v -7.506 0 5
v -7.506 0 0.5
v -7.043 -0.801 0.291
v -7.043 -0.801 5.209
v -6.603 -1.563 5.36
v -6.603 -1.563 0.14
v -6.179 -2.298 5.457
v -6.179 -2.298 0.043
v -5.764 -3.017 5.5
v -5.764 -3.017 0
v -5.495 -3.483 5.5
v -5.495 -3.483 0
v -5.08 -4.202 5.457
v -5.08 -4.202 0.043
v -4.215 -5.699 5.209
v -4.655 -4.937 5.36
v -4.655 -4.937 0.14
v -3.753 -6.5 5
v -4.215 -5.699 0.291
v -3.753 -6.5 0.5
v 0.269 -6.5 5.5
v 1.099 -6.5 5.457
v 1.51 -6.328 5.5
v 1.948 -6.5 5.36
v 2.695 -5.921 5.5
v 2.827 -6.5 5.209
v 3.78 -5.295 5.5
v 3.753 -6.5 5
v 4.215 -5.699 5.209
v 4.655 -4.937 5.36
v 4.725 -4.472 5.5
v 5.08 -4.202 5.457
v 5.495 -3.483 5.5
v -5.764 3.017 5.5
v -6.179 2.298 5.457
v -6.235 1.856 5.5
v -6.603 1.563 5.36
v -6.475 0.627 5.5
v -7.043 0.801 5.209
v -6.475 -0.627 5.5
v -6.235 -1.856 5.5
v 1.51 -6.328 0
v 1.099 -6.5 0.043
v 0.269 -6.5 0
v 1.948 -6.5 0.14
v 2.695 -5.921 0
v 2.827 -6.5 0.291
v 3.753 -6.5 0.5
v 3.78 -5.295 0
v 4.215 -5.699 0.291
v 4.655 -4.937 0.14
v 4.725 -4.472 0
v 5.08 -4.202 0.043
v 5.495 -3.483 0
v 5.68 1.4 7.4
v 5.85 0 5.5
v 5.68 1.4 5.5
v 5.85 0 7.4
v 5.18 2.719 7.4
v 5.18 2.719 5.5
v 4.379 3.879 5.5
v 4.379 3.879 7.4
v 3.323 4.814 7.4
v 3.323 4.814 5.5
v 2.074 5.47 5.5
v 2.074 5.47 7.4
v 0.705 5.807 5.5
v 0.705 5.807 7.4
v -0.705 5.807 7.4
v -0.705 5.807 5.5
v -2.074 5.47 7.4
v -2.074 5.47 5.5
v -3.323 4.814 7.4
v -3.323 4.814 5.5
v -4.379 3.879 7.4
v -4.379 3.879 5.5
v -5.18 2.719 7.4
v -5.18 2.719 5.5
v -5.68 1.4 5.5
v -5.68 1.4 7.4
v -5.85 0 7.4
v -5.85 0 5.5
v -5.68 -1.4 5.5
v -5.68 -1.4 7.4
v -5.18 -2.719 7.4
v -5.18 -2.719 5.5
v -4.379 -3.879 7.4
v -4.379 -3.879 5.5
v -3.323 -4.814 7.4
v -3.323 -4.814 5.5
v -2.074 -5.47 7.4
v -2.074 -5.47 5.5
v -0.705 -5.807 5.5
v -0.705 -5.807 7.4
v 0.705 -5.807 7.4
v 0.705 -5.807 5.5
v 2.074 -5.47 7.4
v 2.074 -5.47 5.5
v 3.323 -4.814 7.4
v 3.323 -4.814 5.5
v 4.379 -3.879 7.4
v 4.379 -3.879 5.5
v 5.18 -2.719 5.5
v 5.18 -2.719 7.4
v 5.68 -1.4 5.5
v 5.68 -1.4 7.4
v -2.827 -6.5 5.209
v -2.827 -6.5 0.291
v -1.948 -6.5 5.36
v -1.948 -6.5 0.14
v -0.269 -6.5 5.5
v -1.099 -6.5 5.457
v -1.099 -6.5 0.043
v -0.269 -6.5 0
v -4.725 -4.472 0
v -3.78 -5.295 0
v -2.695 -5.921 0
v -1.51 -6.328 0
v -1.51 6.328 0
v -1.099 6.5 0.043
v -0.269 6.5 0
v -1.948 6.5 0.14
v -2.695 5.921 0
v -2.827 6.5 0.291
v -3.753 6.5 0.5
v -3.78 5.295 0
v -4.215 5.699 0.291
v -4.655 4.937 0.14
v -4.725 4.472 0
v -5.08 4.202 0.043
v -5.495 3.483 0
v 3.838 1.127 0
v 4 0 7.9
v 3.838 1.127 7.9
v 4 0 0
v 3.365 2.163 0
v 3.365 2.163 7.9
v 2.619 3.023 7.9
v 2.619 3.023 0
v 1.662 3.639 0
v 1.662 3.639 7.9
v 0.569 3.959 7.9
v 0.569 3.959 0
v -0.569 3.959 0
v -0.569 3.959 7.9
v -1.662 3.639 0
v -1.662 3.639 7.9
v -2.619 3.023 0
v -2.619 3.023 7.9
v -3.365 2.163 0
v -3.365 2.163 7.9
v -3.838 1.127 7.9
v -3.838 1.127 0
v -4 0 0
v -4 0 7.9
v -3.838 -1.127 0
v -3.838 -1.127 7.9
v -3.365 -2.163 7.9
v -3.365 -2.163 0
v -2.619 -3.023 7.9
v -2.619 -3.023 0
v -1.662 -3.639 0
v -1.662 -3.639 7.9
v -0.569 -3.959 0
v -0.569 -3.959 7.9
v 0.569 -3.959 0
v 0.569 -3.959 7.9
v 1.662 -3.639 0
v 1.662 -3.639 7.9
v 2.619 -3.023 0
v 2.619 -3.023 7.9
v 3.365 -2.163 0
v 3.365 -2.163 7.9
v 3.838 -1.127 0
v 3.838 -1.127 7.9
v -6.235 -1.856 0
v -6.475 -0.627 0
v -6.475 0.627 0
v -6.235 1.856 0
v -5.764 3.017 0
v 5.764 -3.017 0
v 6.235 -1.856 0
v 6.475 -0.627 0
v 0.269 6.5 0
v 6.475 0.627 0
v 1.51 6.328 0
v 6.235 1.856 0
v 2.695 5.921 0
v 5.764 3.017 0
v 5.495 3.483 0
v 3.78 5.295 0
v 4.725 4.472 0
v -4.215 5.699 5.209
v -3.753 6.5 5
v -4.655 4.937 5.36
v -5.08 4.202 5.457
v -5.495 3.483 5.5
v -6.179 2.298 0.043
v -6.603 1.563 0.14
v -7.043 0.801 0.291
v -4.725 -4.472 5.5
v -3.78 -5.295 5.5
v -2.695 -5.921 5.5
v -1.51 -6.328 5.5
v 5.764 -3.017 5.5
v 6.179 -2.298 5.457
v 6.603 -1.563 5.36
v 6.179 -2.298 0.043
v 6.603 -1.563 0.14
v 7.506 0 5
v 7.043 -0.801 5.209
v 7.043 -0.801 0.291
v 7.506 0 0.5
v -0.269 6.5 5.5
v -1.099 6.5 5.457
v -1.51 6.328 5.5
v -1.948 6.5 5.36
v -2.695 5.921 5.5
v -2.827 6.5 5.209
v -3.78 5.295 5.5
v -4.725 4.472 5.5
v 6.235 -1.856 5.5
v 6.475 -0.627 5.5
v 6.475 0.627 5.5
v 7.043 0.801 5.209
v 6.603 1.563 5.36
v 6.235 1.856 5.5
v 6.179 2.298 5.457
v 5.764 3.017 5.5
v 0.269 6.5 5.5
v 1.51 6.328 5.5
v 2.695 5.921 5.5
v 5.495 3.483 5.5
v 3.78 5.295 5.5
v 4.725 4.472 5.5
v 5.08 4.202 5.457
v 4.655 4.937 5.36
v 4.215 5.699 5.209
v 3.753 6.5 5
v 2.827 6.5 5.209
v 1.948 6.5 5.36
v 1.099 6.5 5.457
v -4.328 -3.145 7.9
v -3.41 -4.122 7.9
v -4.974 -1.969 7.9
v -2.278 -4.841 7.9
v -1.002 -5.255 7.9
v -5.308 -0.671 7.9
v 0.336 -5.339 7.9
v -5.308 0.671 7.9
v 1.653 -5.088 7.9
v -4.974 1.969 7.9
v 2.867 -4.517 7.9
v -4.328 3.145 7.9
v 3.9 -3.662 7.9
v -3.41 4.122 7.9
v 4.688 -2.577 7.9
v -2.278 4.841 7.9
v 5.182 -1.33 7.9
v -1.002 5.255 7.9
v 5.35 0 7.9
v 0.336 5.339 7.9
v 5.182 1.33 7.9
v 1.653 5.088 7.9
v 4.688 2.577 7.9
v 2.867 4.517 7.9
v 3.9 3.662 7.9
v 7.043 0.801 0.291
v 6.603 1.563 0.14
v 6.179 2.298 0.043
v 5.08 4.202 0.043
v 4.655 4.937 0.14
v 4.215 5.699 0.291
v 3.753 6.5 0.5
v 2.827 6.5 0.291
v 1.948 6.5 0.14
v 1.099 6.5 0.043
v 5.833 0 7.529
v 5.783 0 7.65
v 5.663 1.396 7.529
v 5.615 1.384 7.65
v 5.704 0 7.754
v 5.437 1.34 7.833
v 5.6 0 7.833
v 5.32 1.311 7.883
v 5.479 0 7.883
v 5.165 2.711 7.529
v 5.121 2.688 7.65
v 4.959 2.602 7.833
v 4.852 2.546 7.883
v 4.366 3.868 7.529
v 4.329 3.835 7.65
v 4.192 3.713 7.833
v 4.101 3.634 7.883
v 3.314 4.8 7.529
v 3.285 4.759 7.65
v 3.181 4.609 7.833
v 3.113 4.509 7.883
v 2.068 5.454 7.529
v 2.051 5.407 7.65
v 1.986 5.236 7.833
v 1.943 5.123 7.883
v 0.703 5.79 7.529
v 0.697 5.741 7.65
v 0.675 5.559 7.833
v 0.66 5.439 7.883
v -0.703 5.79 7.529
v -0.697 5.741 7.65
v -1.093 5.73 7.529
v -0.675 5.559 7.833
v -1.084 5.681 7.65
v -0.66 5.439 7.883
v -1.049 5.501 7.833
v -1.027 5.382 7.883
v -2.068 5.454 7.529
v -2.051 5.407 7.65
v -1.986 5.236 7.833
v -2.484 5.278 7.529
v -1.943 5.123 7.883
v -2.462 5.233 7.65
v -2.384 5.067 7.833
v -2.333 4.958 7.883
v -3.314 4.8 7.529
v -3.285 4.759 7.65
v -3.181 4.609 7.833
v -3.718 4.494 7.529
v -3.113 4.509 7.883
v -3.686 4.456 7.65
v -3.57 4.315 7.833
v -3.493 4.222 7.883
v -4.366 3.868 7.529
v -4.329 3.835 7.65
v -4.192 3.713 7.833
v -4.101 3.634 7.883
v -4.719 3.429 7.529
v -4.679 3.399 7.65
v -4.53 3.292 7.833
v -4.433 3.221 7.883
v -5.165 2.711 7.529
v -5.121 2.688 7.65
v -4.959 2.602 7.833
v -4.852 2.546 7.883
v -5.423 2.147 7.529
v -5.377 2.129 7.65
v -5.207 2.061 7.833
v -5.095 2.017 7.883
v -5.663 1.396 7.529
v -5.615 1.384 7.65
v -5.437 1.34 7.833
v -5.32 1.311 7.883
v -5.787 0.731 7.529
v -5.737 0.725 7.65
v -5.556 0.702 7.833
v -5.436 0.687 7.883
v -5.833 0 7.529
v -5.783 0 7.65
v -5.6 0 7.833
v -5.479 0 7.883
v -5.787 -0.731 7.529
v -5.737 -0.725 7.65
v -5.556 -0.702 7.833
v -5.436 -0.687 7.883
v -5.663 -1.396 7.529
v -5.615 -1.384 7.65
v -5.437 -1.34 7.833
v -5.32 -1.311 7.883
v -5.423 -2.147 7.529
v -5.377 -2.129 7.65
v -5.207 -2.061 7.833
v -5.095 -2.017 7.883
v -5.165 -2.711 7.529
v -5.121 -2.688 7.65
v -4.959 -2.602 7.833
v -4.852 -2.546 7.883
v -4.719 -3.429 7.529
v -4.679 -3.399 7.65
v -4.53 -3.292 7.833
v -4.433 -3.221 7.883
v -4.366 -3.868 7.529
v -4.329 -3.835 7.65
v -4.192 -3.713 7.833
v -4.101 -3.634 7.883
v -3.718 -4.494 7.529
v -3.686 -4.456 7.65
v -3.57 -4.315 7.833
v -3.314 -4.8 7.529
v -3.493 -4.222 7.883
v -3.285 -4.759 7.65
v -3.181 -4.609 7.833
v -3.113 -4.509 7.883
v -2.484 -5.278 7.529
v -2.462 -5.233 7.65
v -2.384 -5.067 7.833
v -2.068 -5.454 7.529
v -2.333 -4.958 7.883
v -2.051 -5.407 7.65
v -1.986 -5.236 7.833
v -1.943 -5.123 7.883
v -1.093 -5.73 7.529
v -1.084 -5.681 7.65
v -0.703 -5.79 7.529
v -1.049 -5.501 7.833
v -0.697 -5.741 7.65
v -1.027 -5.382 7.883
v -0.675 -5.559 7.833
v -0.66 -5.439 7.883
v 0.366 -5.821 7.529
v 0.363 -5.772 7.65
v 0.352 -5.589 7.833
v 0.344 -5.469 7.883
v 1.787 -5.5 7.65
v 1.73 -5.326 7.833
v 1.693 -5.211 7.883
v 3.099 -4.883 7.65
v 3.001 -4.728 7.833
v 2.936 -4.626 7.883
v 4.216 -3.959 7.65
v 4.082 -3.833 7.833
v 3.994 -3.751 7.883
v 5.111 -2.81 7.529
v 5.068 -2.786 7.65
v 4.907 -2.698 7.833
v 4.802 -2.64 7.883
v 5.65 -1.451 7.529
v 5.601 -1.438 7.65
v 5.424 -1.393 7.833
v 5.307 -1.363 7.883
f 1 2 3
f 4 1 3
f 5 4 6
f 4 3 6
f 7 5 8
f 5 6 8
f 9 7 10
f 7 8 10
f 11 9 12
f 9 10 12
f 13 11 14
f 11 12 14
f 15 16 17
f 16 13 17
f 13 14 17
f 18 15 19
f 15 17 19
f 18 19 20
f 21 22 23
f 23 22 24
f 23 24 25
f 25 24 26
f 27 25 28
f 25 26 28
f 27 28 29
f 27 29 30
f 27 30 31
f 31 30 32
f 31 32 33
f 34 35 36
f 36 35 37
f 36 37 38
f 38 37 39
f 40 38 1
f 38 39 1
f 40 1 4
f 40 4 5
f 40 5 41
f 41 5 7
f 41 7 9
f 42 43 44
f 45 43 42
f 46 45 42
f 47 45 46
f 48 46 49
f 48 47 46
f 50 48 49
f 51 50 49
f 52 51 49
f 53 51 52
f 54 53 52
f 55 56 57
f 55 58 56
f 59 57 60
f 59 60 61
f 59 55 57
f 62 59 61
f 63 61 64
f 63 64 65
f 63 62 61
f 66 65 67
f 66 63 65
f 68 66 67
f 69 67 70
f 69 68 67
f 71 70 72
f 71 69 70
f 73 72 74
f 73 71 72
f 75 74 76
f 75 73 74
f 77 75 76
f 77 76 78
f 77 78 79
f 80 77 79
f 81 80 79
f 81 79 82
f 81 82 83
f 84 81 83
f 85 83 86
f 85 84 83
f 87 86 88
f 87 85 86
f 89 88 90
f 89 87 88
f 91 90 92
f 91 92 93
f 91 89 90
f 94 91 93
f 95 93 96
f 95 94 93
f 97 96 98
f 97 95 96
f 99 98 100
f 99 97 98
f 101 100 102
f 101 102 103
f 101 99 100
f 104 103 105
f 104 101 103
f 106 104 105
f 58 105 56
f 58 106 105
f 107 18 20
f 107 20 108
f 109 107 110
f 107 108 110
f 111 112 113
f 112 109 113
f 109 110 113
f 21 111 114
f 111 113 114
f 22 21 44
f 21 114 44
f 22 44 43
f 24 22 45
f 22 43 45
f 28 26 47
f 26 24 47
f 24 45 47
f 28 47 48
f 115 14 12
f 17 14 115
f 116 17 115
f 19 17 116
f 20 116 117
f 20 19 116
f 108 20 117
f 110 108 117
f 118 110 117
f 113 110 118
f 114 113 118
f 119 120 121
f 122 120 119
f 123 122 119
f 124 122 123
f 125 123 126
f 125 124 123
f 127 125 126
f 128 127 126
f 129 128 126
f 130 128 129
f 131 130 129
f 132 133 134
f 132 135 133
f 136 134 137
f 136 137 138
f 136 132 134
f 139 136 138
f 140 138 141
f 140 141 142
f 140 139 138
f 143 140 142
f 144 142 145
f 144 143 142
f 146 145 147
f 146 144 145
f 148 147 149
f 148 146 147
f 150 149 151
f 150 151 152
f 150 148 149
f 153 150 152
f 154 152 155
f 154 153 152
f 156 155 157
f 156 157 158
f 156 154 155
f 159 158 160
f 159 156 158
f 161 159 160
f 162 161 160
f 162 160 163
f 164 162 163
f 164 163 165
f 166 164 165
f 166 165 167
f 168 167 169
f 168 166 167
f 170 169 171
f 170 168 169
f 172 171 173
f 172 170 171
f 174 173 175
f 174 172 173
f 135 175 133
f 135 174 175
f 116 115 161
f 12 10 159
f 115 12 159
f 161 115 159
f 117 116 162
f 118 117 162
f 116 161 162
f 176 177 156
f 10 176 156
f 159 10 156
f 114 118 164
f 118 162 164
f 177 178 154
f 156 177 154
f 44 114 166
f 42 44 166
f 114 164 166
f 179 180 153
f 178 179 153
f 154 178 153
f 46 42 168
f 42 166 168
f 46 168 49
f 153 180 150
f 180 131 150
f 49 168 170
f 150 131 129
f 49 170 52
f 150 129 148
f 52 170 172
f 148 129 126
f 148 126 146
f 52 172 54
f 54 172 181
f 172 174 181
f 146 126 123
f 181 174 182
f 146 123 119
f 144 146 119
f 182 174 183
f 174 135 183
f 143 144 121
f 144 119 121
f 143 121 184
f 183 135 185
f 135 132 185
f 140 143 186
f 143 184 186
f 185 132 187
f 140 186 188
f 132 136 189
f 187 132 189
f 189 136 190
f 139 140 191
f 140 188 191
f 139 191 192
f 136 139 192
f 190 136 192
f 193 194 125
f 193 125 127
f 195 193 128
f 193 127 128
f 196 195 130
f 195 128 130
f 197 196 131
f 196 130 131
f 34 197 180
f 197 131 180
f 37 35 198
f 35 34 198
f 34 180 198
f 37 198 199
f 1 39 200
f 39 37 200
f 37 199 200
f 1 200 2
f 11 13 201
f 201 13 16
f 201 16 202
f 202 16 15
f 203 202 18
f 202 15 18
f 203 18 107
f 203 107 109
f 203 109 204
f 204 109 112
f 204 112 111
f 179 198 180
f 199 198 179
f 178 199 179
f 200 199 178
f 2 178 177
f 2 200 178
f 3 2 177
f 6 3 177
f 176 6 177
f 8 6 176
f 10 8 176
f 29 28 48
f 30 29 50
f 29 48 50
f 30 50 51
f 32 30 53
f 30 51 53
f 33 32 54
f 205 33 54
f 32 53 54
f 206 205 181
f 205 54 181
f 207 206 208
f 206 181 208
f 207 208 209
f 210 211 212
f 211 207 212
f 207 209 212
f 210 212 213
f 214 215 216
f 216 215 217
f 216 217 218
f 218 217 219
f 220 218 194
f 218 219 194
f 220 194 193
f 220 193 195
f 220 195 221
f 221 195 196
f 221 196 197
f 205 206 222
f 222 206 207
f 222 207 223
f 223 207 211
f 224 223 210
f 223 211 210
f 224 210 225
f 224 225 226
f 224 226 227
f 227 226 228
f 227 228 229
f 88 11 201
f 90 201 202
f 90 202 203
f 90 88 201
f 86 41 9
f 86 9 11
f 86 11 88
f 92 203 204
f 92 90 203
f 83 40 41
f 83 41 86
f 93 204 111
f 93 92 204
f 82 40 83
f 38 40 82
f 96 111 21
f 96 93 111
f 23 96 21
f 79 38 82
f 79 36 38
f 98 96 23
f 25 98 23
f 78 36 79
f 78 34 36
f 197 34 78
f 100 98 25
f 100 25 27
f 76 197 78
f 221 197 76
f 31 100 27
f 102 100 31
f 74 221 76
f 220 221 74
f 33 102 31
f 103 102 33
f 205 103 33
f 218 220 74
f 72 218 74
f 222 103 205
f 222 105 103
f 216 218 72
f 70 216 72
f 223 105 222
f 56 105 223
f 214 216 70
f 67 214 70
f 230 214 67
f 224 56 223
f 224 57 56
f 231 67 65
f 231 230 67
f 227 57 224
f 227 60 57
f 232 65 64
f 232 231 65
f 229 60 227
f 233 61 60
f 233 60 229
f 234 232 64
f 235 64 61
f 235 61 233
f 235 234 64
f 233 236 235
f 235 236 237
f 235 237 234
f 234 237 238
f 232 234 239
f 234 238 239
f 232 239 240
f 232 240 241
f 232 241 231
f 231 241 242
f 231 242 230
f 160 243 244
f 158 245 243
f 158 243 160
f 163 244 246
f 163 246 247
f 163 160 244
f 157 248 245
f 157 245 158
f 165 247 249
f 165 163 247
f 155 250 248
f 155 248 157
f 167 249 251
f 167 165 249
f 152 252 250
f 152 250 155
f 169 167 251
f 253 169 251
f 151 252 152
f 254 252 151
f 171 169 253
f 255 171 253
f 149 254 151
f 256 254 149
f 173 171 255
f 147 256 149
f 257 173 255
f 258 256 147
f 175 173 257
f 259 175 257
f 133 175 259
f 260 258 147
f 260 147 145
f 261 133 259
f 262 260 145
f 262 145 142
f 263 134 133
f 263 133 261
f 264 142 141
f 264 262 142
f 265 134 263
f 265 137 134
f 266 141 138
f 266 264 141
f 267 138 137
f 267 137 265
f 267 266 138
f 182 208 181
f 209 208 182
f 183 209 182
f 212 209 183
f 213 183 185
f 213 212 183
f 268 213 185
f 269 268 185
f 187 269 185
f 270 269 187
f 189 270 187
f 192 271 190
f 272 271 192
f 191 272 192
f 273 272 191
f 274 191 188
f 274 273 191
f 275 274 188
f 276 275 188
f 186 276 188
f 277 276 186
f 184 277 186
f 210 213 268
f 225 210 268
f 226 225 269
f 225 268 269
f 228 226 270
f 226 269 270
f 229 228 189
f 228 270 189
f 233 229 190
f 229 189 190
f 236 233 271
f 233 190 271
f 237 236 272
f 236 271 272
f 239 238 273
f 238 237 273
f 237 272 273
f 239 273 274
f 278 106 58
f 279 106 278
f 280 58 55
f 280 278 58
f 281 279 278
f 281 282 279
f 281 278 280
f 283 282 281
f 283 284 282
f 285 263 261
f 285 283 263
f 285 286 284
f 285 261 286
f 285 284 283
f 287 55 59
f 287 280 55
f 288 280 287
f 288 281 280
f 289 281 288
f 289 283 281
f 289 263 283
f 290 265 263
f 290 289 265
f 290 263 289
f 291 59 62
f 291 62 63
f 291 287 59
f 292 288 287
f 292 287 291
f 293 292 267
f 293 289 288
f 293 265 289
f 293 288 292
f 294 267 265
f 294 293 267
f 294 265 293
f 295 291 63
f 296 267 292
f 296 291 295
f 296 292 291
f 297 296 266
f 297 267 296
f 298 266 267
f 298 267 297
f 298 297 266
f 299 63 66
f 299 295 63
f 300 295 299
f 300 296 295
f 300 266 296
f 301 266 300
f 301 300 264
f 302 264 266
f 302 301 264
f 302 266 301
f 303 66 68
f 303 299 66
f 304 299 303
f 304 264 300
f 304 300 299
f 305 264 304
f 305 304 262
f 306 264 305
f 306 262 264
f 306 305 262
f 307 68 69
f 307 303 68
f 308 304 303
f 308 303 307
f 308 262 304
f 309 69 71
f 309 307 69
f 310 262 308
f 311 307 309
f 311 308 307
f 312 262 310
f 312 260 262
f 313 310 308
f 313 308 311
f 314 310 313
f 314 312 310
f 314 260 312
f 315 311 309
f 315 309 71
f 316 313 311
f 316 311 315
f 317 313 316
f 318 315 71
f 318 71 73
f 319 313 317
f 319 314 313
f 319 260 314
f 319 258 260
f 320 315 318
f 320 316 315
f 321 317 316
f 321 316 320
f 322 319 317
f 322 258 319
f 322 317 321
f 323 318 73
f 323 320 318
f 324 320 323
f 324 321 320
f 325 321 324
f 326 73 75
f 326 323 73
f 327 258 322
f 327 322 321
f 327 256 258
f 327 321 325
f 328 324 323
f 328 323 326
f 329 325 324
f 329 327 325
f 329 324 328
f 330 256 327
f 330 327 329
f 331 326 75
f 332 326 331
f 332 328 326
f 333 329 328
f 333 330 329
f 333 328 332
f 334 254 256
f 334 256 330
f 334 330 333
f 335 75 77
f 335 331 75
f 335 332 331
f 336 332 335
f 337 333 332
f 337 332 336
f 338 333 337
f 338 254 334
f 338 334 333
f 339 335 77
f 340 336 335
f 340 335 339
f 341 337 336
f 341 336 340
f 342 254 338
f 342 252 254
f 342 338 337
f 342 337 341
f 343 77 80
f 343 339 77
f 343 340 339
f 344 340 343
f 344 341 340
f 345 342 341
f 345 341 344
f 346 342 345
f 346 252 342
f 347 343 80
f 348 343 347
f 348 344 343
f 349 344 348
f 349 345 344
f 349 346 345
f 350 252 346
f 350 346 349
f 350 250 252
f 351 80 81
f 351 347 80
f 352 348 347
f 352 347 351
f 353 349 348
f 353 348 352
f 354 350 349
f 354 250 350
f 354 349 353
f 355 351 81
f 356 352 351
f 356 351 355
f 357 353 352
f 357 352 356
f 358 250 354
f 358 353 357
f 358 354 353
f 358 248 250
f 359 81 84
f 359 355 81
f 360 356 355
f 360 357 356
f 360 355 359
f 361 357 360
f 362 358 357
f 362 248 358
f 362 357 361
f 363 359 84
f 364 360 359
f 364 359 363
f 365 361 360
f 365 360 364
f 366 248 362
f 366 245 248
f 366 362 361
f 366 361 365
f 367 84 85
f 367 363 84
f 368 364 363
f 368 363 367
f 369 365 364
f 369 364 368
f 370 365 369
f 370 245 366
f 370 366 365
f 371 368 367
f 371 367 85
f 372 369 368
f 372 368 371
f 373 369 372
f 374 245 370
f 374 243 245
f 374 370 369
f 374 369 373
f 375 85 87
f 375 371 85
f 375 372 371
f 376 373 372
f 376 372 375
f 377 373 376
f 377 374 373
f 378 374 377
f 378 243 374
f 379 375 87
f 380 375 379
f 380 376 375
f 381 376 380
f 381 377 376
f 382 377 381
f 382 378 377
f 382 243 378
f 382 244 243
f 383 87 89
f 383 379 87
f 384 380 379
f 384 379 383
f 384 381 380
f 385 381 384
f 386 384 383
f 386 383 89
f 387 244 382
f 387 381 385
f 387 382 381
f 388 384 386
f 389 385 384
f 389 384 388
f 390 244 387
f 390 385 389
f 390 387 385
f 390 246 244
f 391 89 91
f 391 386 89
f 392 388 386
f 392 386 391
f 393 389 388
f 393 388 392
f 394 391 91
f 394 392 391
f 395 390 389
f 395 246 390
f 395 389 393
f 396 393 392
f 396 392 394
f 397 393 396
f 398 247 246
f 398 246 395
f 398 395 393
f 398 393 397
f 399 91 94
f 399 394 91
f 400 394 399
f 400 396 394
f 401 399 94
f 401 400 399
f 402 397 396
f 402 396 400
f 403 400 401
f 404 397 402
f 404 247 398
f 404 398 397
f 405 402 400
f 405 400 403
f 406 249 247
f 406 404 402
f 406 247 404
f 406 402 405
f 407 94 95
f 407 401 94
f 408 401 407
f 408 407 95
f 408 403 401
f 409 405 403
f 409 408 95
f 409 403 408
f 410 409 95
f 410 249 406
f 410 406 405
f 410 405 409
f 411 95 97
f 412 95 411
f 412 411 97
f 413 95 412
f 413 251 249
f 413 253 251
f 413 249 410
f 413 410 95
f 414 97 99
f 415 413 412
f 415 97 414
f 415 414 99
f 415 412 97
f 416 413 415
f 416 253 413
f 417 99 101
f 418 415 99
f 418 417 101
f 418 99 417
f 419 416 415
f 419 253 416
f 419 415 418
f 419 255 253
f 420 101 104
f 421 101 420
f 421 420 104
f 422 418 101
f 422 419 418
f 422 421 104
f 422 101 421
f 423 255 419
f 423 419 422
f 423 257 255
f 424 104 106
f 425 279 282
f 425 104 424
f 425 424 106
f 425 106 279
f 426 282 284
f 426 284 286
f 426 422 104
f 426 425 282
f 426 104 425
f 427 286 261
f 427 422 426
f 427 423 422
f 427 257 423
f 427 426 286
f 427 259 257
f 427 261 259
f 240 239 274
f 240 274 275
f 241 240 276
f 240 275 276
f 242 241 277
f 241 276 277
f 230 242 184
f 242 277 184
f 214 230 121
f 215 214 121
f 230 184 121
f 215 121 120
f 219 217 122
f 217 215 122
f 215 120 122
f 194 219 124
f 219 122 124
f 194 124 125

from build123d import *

# Parameters (mm, degrees)
SKETCH024_R = 4
PAD_DEPTH   = 5.5


with BuildPart() as part:
    # Sketch024 → Pad (new body)
    with BuildSketch(Plane.XY):
        Polygon((7.5055534995, 0), (3.7527767497, 6.5), (-3.7527767497, 6.5), (-7.5055534995, 0), (-3.7527767497, -6.5), (3.7527767497, -6.5), align=None)
        Circle(SKETCH024_R, mode=Mode.SUBTRACT)
    extrude(amount=PAD_DEPTH)

    # Sketch025 → Revolution005 (revolve)
    with BuildSketch(Plane.XZ):
        with BuildLine():
            Line((4, 5.5), (5.85, 5.5))
            Line((5.85, 5.5), (5.85, 7.4))
            ThreePointArc((5.85, 7.4), (5.7035533906, 7.7535533906), (5.35, 7.9))
            Line((5.35, 7.9), (4, 7.9))
            Line((4, 7.9), (4, 5.5))
        make_face()
    revolve(axis=Axis((0, 0, 0), (0, 0, 1)))

    # Sketch026 → Groove (revolve, cut)
    with BuildSketch(Plane.XZ):
        Polygon((7.5055534995, 5.5), (6.5055534995, 5.5), (7.5055534995, 5), align=None)
        Polygon((7.5055534995, 0), (6.5055534995, 0), (7.5055534995, 0.5), align=None)
    revolve(axis=Axis((0, 0, 0), (0, 0, 1)), mode=Mode.SUBTRACT)


solid = part.part
